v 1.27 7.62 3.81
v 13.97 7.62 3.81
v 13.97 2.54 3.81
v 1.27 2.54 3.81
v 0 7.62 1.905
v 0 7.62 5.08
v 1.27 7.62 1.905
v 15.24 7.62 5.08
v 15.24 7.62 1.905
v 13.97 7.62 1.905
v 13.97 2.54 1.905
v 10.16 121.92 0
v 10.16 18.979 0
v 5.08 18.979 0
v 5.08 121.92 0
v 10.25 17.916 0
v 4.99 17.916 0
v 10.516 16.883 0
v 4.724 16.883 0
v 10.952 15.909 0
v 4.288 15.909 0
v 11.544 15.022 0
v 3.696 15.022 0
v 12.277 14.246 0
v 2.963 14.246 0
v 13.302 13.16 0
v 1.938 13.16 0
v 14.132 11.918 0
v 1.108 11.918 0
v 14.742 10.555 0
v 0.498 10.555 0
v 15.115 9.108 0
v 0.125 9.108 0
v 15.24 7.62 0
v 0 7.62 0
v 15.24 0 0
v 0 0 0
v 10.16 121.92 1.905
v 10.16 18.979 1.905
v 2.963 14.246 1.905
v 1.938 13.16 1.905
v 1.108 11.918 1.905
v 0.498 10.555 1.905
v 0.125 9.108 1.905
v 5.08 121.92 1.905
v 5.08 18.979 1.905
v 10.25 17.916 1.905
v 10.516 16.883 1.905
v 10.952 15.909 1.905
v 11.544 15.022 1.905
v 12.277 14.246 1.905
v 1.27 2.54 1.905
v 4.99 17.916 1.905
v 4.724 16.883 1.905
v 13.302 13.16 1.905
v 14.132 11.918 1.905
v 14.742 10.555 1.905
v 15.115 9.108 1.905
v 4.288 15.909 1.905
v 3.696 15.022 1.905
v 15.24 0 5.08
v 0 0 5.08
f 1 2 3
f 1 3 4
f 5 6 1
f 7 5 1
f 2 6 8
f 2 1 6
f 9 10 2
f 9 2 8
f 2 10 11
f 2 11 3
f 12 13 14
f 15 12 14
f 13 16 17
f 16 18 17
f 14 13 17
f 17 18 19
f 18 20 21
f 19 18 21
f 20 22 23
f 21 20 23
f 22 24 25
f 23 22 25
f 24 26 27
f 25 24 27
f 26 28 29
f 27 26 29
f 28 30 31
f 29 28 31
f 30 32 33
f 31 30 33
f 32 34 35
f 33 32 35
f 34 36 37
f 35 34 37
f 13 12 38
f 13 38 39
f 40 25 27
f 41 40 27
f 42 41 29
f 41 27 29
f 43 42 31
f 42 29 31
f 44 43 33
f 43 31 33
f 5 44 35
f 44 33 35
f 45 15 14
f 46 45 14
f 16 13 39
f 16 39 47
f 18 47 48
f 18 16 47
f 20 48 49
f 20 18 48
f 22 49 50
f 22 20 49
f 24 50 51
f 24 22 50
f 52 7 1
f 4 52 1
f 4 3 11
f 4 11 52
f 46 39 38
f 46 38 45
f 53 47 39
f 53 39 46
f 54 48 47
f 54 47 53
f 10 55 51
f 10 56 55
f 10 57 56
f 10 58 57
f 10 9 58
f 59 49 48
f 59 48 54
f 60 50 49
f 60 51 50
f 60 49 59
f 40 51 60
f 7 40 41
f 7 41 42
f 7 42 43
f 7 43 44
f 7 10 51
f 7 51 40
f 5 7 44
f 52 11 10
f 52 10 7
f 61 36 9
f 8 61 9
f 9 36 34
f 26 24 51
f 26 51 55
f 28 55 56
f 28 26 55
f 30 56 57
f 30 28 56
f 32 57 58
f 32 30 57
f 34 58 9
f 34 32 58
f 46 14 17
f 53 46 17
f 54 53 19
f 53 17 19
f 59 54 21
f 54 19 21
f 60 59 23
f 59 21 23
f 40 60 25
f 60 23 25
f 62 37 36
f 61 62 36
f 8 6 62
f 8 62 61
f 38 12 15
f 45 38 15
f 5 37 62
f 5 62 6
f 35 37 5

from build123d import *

# Parameters (mm, degrees)
F0_W     = 15.24
F0_H     = 7.62
F1_DEPTH = 5.08
F2_W     = 12.7
F2_H     = 1.905
F3_DEPTH = 5.08
F5_DEPTH = 1.905


# Not quite as in the source:
# - a feature names something its author has since deleted; it is built from what else it names


with BuildPart() as f1:
    # F0 (on Top) → F1 (new body)
    with BuildSketch(Plane.XY):
        with Locations((7.62, 3.81)):
            Rectangle(F0_W, F0_H)
    extrude(amount=F1_DEPTH)

    # F2 (on face) → F3 (cut, through all)
    with BuildSketch(Plane(origin=(0, 7.62, 0), x_dir=(-1, 0, 0), z_dir=(0, 1, 0))):
        with Locations((-7.62, 2.8575)):
            Rectangle(F2_W, F2_H)
    extrude(amount=-F3_DEPTH, mode=Mode.SUBTRACT)

    # F4 (on face) → F5 (join, through all)
    with BuildSketch(Plane(origin=(0, 0, 0), x_dir=(1, 0, 0), z_dir=(0, 0, -1))):
        with BuildLine():
            ThreePointArc((10.16, -18.9792253257), (10.7132695997, -16.3868486813), (12.2766666667, -14.2462147733))
            ThreePointArc((12.2766666667, -14.2462147733), (14.4654225604, -11.2493273022), (15.24, -7.62))
            Line((15.24, -7.62), (7.62, -7.62))
            Line((7.62, -7.62), (7.62, -121.92))
            Line((7.62, -121.92), (10.16, -121.92))
            Line((10.16, -121.92), (10.16, -18.9792253257))
        make_face()
    extrude(amount=-F5_DEPTH)

    # F6: F1 across face


with BuildPart() as f1_1:
    add(f1.part)
    add(f1.part.mirror(Plane(origin=(7.62, 64.77, 0.9525), x_dir=(0, -1, 0), z_dir=(-1, 0, 0))))


solid = f1_1.part
